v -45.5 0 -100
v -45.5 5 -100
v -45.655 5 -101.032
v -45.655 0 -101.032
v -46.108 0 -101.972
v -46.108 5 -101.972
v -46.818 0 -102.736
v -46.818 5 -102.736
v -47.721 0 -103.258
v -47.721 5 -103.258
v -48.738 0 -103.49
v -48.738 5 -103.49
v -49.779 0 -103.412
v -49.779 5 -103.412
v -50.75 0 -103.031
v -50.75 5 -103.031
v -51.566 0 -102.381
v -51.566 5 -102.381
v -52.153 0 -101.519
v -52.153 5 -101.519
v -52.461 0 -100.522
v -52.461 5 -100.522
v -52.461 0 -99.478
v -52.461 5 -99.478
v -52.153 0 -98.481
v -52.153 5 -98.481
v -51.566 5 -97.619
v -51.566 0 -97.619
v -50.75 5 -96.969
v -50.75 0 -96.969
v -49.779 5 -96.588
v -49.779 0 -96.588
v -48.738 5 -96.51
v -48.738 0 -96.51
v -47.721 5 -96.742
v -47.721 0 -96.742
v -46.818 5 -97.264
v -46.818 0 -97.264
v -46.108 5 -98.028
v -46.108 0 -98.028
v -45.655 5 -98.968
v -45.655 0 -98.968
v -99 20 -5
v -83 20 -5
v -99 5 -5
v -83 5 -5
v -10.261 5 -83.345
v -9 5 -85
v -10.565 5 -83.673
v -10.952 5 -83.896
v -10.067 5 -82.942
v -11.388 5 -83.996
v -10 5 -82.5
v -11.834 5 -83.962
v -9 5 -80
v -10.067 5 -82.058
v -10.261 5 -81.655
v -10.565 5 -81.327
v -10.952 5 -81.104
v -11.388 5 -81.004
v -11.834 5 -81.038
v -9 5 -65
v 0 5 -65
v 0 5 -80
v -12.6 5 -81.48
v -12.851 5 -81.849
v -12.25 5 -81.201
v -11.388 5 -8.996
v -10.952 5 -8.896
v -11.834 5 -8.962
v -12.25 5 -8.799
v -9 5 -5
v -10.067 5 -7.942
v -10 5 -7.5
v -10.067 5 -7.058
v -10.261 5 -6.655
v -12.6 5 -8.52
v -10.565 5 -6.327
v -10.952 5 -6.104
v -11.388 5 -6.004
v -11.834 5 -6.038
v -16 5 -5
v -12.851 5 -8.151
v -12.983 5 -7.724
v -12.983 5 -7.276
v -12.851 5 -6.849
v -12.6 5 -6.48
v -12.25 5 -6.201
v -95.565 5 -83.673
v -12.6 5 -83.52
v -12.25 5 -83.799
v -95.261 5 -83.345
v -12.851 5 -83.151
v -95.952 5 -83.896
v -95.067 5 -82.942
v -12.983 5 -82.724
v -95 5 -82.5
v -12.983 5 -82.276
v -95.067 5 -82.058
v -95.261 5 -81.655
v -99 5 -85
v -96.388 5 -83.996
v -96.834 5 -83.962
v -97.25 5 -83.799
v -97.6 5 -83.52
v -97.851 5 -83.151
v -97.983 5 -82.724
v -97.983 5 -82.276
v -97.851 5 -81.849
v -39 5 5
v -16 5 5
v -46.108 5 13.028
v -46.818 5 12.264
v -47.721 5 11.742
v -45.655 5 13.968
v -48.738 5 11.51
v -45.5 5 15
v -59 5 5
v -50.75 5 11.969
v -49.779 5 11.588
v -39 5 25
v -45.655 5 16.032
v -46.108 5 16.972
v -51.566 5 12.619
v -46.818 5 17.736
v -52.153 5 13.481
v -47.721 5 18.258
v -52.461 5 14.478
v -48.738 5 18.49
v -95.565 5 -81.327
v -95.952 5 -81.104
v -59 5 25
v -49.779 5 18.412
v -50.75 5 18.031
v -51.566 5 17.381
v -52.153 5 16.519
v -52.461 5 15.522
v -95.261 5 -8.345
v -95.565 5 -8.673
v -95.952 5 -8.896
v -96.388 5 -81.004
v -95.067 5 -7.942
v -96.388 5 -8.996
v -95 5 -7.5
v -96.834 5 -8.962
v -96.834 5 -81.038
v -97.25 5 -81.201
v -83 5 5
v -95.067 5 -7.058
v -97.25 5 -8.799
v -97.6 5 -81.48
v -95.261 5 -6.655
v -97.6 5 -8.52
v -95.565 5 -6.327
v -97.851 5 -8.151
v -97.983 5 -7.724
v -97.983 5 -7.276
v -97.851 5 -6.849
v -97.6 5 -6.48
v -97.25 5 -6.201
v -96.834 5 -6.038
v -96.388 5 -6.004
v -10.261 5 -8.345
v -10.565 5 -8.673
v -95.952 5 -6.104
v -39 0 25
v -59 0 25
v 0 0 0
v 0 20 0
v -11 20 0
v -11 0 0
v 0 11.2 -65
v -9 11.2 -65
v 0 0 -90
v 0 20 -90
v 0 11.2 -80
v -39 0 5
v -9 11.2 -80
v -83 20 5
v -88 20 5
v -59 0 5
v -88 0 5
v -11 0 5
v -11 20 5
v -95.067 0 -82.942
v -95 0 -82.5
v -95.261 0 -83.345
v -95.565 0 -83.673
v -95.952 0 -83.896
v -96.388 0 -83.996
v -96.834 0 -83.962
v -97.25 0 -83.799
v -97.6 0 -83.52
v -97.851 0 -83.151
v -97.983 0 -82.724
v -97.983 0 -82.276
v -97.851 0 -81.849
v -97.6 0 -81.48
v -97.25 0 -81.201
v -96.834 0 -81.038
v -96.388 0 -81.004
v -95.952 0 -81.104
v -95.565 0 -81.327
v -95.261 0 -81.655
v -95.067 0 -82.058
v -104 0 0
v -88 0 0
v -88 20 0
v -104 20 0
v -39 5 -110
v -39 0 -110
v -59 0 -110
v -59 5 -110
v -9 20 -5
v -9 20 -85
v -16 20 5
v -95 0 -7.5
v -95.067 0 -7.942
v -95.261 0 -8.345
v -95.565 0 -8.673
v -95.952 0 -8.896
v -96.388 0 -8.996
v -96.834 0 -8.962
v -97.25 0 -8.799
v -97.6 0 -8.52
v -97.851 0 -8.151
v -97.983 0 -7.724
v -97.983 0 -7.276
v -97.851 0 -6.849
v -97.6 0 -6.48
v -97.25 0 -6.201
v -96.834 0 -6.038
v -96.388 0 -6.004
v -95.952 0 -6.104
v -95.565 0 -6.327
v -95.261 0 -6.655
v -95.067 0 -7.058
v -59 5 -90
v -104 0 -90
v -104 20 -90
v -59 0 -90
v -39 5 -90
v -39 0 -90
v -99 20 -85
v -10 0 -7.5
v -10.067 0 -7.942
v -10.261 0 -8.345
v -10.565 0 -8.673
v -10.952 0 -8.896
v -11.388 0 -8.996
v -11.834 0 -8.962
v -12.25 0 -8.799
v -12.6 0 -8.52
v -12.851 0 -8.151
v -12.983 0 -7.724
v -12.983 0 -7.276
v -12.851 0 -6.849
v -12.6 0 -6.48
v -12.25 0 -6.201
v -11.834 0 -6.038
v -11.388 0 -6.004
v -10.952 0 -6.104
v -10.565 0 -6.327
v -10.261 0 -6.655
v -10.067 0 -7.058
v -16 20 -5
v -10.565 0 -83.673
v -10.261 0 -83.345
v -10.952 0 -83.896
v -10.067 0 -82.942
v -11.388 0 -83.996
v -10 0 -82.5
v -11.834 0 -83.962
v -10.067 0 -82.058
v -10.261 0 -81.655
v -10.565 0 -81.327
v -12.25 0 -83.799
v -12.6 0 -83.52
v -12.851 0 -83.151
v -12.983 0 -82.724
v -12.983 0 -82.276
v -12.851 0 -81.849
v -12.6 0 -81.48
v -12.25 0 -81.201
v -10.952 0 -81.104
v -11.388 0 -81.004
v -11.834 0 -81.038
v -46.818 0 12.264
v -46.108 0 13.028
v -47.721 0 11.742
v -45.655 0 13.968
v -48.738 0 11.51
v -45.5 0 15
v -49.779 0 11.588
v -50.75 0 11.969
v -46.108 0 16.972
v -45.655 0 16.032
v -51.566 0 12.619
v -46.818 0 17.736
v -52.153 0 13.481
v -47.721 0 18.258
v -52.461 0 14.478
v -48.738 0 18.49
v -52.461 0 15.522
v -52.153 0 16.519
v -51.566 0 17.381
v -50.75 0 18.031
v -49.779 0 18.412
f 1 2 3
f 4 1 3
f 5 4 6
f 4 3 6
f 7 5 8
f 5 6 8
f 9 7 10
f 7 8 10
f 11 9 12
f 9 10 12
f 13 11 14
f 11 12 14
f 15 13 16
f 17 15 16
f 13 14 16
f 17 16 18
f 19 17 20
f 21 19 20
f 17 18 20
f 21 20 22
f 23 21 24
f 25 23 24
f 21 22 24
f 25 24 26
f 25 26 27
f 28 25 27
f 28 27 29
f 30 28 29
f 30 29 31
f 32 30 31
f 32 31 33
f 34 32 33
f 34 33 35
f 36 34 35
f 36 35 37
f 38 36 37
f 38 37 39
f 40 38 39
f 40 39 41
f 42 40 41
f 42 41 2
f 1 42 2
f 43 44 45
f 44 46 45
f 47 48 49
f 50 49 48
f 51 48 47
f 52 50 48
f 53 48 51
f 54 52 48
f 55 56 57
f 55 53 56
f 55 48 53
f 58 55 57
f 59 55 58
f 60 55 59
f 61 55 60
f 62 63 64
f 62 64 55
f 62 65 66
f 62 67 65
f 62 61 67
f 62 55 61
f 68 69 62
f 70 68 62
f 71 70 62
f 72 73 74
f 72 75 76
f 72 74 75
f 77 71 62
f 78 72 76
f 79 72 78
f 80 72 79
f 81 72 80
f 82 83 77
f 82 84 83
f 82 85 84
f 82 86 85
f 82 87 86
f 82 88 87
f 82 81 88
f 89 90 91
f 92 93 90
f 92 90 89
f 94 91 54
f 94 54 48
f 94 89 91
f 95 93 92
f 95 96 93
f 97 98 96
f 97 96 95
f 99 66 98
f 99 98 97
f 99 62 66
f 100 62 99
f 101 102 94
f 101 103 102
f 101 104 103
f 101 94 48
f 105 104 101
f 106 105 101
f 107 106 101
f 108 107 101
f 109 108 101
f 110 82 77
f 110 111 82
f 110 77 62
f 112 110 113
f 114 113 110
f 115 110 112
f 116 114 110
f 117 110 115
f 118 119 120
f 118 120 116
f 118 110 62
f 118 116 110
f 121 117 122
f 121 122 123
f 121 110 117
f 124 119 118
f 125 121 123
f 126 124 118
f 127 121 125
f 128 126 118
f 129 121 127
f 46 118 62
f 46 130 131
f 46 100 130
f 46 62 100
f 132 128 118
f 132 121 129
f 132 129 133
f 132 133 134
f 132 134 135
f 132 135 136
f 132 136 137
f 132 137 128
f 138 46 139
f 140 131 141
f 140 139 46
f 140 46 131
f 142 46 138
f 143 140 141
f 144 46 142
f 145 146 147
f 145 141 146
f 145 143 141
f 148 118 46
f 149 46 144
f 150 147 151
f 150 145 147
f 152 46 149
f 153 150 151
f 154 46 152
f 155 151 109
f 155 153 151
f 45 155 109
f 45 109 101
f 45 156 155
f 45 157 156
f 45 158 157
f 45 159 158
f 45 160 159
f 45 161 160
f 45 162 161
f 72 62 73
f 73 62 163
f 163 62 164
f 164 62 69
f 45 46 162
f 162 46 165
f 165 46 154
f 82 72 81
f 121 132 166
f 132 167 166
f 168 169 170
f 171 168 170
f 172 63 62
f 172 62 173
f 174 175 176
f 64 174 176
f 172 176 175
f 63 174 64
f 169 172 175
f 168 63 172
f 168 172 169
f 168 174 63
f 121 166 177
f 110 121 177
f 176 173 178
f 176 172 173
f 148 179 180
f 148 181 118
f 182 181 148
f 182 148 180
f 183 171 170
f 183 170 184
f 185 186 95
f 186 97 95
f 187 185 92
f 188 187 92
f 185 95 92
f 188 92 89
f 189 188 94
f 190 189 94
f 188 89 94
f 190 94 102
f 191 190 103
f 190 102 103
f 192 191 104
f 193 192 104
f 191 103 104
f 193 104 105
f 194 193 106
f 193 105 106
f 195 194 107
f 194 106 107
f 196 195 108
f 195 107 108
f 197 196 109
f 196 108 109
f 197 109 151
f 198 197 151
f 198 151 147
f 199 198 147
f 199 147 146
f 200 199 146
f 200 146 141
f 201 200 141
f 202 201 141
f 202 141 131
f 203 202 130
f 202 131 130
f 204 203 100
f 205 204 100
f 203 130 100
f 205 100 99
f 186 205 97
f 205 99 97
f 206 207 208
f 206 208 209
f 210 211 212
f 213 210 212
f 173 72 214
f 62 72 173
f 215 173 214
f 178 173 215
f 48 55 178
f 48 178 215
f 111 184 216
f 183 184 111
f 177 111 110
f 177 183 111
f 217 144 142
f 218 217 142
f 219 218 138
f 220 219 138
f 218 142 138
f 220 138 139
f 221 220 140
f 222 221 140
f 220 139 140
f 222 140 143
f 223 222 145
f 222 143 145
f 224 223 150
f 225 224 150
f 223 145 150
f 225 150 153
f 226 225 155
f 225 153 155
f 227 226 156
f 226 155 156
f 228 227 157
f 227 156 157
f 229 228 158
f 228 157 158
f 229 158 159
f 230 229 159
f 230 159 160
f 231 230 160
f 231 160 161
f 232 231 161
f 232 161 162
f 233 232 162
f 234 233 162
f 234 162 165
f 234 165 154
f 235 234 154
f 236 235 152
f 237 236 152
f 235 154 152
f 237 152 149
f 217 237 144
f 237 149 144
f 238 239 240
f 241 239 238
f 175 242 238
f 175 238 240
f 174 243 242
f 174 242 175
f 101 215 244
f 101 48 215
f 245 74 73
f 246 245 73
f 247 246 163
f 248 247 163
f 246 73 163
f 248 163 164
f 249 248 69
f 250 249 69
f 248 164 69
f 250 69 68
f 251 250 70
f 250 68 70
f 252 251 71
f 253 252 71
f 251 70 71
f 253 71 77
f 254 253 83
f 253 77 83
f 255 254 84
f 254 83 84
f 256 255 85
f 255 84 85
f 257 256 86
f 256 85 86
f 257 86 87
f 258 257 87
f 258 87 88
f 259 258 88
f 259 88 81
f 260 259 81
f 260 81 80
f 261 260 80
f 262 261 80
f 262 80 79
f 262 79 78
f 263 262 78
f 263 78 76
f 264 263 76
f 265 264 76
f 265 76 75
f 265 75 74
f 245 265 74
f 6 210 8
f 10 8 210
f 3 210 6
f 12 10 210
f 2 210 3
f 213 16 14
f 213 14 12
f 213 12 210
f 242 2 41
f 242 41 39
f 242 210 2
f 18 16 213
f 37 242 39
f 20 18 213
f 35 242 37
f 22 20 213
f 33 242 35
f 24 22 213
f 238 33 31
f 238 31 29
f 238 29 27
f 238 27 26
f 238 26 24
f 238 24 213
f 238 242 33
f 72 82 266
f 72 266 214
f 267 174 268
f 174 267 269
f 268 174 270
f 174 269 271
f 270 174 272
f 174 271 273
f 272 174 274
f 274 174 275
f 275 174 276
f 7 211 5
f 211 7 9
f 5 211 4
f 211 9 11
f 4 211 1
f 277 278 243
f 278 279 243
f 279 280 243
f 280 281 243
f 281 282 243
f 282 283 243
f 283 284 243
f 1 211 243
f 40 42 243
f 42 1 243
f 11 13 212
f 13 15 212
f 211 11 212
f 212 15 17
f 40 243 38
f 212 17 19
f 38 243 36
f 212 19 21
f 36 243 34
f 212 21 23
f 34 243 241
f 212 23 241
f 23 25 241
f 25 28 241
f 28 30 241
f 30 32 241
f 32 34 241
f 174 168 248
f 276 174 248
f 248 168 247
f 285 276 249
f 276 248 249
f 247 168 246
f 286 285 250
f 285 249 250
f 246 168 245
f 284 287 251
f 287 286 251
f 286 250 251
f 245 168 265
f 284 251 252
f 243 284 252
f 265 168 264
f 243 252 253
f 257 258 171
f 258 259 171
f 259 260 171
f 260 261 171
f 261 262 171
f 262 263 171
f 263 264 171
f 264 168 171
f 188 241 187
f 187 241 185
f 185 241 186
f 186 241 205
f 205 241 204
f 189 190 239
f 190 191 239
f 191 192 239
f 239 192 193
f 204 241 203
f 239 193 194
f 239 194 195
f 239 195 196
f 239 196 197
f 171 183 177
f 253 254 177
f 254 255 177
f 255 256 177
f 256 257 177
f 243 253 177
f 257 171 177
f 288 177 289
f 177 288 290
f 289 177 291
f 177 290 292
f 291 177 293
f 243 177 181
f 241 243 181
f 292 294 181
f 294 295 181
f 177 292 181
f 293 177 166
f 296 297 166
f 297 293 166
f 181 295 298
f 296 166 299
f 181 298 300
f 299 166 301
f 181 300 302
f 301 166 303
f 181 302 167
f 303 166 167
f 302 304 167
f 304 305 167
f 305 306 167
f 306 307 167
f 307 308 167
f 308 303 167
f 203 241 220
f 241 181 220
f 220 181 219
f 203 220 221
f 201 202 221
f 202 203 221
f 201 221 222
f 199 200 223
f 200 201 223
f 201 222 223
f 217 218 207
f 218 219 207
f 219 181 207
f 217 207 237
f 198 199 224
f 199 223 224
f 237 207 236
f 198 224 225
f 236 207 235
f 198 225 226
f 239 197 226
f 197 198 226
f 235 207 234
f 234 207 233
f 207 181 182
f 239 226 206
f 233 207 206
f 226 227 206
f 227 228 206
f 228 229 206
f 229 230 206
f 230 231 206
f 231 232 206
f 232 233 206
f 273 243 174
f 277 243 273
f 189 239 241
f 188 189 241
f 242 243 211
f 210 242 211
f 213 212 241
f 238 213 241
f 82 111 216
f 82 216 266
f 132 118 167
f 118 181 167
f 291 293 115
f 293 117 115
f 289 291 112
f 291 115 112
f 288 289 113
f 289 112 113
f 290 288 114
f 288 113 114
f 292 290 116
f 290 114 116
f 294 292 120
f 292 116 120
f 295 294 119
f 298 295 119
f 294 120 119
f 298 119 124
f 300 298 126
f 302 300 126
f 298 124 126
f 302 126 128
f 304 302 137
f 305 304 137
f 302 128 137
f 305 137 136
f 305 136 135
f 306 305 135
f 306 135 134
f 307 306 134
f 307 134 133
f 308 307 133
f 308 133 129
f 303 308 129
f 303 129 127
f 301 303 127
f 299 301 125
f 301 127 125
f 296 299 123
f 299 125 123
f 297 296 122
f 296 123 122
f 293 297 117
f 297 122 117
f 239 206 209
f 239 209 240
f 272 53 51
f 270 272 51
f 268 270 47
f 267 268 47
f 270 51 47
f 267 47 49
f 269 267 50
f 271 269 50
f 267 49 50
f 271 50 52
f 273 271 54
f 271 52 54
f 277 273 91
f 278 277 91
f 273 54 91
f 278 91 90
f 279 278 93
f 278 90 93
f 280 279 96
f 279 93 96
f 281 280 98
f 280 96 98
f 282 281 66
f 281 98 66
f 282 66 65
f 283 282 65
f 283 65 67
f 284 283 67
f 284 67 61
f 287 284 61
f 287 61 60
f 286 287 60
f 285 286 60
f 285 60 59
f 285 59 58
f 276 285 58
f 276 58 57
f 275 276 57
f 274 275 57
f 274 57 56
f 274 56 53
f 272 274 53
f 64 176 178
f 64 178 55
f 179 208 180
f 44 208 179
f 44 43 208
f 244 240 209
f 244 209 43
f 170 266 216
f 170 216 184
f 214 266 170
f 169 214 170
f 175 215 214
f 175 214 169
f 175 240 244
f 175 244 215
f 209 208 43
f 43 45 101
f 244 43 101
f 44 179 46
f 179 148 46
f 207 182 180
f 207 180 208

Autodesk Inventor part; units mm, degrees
ref_plane "YZ Plane" through (0, 0, 0) normal (1, 0, 0) x (0, 1, 0)
ref_plane "XZ Plane" through (0, 0, 0) normal (0, 1, 0) x (-1, 0, 0)
ref_plane "XY Plane" through (0, 0, 0) normal (0, 0, 1) x (1, 0, 0)
sketch "스케치1" plane through (0, 0, 0) normal (0, 1, 0) x (-1, 0, 0)
  line L0 (0, 0) -> (104, 0)
  line L1 (104, 0) -> (104, -90)
  line L2 (104, -90) -> (0, -90)
  line L3 (0, -90) -> (0, 0)
  line L4 (59, -90) -> (39, -90)
  line L5 (39, -90) -> (39, -110)
  line L6 (39, -110) -> (59, -110)
  line L7 (59, -110) -> (59, -90)
  line L8 (88, 0) -> (11, 0)
  line L9 (11, 0) -> (11, 5)
  line L10 (11, 5) -> (88, 5)
  line L11 (88, 5) -> (88, 0)
  line L12 (39, 5) -> (59, 5)
  line L13 (59, 5) -> (59, 25)
  line L14 (59, 25) -> (39, 25)
  line L15 (39, 25) -> (39, 5)
  point P0 (49, -110)
  point P1 (11, 2.5)
  point P2 (88, 2.5)
  dimension "d0" = 90
  dimension "d1" = 104
  dimension "d2" = 39
  dimension "d3" = 59
  dimension "d4" = 20
  dimension "d5" = 5
  dimension "d6" = 11
  dimension "d7" = 16
  dimension "d8" = 39
  dimension "d9" = 59
  dimension "d10" = 20
extrude "돌출1" add sketch "스케치1" along normal blind 5
sketch "스케치2" plane through (0, 5, 0) normal (0, 1, 0) x (1, 0, 0)
  line L0 (-88, -5) -> (-59, -5) projected
  line L1 (-88, -5) -> (-83, -5)
  line L2 (-83, -5) -> (-83, 5)
  line L3 (-83, 5) -> (-88, 5)
  line L4 (-88, 5) -> (-88, -5)
  line L5 (-104, 90) -> (-104, 0) projected
  line L6 (-104, 0) -> (-83, 0)
  line L7 (-83, 0) -> (-83, 5)
  line L8 (-83, 5) -> (-104, 5)
  line L9 (-104, 5) -> (-104, 0)
  line L10 (-104, 0) -> (-88, 0) projected
  line L11 (-59, 90) -> (-104, 90) projected
  line L12 (-104, 0) -> (-99, 0)
  line L13 (-99, 0) -> (-99, 90)
  line L14 (-99, 90) -> (-104, 90)
  line L15 (-104, 90) -> (-104, 0)
  line L16 (-104, 90) -> (0, 90)
  line L17 (0, 90) -> (0, 85)
  line L18 (0, 85) -> (-104, 85)
  line L19 (-104, 85) -> (-104, 90)
  line L20 (0, 90) -> (-5.4966, 90)
  line L21 (-39, -5) -> (-11, -5) projected
  line L22 (-11, -5) -> (-16.7717, -5)
  line L23 (-11, -5) -> (-16, -5)
  line L24 (-16, -5) -> (-16, 6.6946)
  line L25 (-11, 6.6946) -> (-11, -5)
  line L26 (-11, 0) -> (0, 0) projected
  line L27 (0, 0) -> (-5, 0)
  line L28 (-5, 0) -> (-5, 90)
  line L29 (-5, 90) -> (0, 90)
  line L30 (0, 90) -> (0, 0)
  line L31 (0, 0) -> (-16, 0)
  line L32 (-16, 0) -> (-16, 5)
  line L33 (-16, 5) -> (0, 5)
  line L34 (0, 5) -> (0, 0)
  point P0 (-88, 0)
  point P1 (-99, 5)
  point P2 (-99, 85)
  point P3 (-5, 85)
  point P4 (-5, 5)
  dimension "d13" = 5
  dimension "d14" = 5
  dimension "d15" = 5
  dimension "d16" = 5
  dimension "d17" = 5
  dimension "d18" = 5
  dimension "d19" = 5
extrude "돌출2" add sketch "스케치2" along normal blind 15
sketch "스케치4" plane through (0, 5, 0) normal (0, 1, 0) x (1, 0, 0)
  line L0 (-59, 90) -> (-104, 90) projected
  line L1 (-39, 110) -> (-59, 110) projected
  line L2 (-59, 90) -> (-39, 110)
  line L3 (-59, 110) -> (-59, 90) projected
  line L4 (-59, -25) -> (-39, -25) projected
  line L5 (-39, -25) -> (-39, -5) projected
  line L6 (-59, -25) -> (-39, -5)
  line L7 (-83, -5) -> (-59, -5) projected
  line L8 (-39, -25) -> (-59, -5)
  circle A0 centre (-49, -15) radius 3.5
  circle A1 centre (-49, 100) radius 3.5
  line L9 (-39, 90) -> (-39, 110) projected
  line L10 (-59, 110) -> (-39, 90)
  point P0 (0, 0)
  dimension "d23" = 7
  dimension "d24" = 7
extrude "돌출3" cut sketch "스케치4" against normal blind 15 contours A1 L10 L2 | L2 L10 A1 | L10 L2 A1 | L10 A1 L2 | A0 L8 L6 | L6 L8 A0 | L8 L6 A0 | L8 A0 L6
sketch "스케치5" plane through (0, 5, 0) normal (0, 1, 0) x (1, 0, 0)
  line L0 (-5, 5) -> (-5, 85) projected
  line L1 (-5, 85) -> (-99, 85) projected
  line L2 (-5, 5) -> (-8, 5)
  line L3 (-8, 5) -> (-8, 85)
  line L4 (-8, 85) -> (-5, 85)
  line L5 (-5, 85) -> (-5, 5)
  line L6 (0, 0) -> (0, 90) projected
  dimension "d27" = 8
extrude "돌출4" add sketch "스케치5" along normal blind 15
sketch "스케치6" plane through (0, 5, 0) normal (0, 1, 0) x (1, 0, 0)
  circle A0 centre (-96.5, 7.5) radius 1.5
  circle A1 centre (-96.5, 82.5) radius 1.5
  circle A2 centre (-10.5, 82.5) radius 1.5
  circle A3 centre (-10.5, 7.5) radius 1.5
  line L0 (-83, 5) -> (-99, 5) projected
  line L1 (-99, 5) -> (-99, 85) projected
  line L2 (-99, 85) -> (-8, 85) projected
  line L3 (-8, 85) -> (-8, 5) projected
  line L4 (-8, 5) -> (-16, 5) projected
  point P0 (0, 0)
  dimension "d30" = 3
  dimension "d31" = 3
  dimension "d32" = 3
  dimension "d33" = 3
  dimension "d34" = 2.5
  dimension "d35" = 2.5
  dimension "d36" = 2.5
  dimension "d37" = 2.5
  dimension "d38" = 2.5
  dimension "d39" = 2.5
  dimension "d40" = 2.5
  dimension "d41" = 2.5
extrude "돌출5" cut sketch "스케치6" against normal blind 30
sketch "스케치7" plane through (0, 0, 0) normal (1, 0, 0) x (0, 0, -1)
  line L0 (65, 11.2) -> (80, 11.2)
  line L1 (80, 11.2) -> (80, 5)
  line L2 (80, 5) -> (65, 5)
  line L3 (65, 5) -> (65, 11.2)
  line L4 (0, 0) -> (90, 0) projected
  line L5 (90, 0) -> (90, 20) projected
  point P0 (80, 8.1)
  dimension "d44" = 5
  dimension "d45" = 10
  dimension "d46" = 6.2
  dimension "d47" = 15
extrude "돌출6" cut sketch "스케치7" against normal blind 30
sketch "스케치9" plane through (0, 5, 0) normal (0, 1, 0) x (1, 0, 0)
  circle A0 centre (-10.5, 7.5) radius 1.5 projected
  circle A1 centre (-10.5, 7.5) radius 1.5
  circle A2 centre (-10.5, 82.5) radius 1.5 projected
  circle A3 centre (-10.5, 82.5) radius 1.5
  point P0 (0, 0)
extrude "돌출7" add sketch "스케치9" against normal blind 5
sketch "스케치10" plane through (0, 5, 0) normal (0, 1, 0) x (1, 0, 0)
  line L0 (-8, 85) -> (-8, 5) projected
  line L1 (-8, 85) -> (-99, 85) projected
  line L2 (-8, 5) -> (-9, 5)
  line L3 (-9, 5) -> (-9, 85)
  line L4 (-9, 85) -> (-8, 85)
  line L5 (-8, 85) -> (-8, 5)
  point P0 (0, 0)
  dimension "d52" = 1
extrude "돌출8" add sketch "스케치10" along normal blind 15
sketch "스케치11" plane through (-8, 5, -65) normal (1, 0, 0) x (0, 0, -1)
  line L0 (0, 0) -> (0, 6.2) projected
  line L1 (15, 6.2) -> (15, 0) projected
  line L2 (0, 6.2) -> (15, 6.2)
  line L3 (15, 6.2) -> (15, 0)
  line L4 (15, 0) -> (0, 0)
  line L5 (0, 0) -> (0, 6.2)
  point P0 (-65, -5)
extrude "돌출9" cut sketch "스케치11" against normal blind 15
sketch "스케치12" plane through (0, 5, 0) normal (0, 1, 0) x (1, 0, 0)
  circle A0 centre (-11.5, 7.5) radius 1.5
  circle A1 centre (-11.5, 82.5) radius 1.5
  line L0 (-9, 85) -> (-9, 5) projected
  line L1 (-9, 5) -> (-16, 5) projected
  line L2 (-99, 85) -> (-9, 85) projected
  point P0 (0, 0)
  dimension "d57" = 3
  dimension "d58" = 3
  dimension "d59" = 2.5
  dimension "d60" = 2.5
  dimension "d61" = 2.5
  dimension "d62" = 2.5
extrude "돌출10" cut sketch "스케치12" against normal blind 15
equation "\"TransitionRadius\" = BendRadius"
equation "\"BendRadius\" = 0.5"
properties part number "imu_case_new"
